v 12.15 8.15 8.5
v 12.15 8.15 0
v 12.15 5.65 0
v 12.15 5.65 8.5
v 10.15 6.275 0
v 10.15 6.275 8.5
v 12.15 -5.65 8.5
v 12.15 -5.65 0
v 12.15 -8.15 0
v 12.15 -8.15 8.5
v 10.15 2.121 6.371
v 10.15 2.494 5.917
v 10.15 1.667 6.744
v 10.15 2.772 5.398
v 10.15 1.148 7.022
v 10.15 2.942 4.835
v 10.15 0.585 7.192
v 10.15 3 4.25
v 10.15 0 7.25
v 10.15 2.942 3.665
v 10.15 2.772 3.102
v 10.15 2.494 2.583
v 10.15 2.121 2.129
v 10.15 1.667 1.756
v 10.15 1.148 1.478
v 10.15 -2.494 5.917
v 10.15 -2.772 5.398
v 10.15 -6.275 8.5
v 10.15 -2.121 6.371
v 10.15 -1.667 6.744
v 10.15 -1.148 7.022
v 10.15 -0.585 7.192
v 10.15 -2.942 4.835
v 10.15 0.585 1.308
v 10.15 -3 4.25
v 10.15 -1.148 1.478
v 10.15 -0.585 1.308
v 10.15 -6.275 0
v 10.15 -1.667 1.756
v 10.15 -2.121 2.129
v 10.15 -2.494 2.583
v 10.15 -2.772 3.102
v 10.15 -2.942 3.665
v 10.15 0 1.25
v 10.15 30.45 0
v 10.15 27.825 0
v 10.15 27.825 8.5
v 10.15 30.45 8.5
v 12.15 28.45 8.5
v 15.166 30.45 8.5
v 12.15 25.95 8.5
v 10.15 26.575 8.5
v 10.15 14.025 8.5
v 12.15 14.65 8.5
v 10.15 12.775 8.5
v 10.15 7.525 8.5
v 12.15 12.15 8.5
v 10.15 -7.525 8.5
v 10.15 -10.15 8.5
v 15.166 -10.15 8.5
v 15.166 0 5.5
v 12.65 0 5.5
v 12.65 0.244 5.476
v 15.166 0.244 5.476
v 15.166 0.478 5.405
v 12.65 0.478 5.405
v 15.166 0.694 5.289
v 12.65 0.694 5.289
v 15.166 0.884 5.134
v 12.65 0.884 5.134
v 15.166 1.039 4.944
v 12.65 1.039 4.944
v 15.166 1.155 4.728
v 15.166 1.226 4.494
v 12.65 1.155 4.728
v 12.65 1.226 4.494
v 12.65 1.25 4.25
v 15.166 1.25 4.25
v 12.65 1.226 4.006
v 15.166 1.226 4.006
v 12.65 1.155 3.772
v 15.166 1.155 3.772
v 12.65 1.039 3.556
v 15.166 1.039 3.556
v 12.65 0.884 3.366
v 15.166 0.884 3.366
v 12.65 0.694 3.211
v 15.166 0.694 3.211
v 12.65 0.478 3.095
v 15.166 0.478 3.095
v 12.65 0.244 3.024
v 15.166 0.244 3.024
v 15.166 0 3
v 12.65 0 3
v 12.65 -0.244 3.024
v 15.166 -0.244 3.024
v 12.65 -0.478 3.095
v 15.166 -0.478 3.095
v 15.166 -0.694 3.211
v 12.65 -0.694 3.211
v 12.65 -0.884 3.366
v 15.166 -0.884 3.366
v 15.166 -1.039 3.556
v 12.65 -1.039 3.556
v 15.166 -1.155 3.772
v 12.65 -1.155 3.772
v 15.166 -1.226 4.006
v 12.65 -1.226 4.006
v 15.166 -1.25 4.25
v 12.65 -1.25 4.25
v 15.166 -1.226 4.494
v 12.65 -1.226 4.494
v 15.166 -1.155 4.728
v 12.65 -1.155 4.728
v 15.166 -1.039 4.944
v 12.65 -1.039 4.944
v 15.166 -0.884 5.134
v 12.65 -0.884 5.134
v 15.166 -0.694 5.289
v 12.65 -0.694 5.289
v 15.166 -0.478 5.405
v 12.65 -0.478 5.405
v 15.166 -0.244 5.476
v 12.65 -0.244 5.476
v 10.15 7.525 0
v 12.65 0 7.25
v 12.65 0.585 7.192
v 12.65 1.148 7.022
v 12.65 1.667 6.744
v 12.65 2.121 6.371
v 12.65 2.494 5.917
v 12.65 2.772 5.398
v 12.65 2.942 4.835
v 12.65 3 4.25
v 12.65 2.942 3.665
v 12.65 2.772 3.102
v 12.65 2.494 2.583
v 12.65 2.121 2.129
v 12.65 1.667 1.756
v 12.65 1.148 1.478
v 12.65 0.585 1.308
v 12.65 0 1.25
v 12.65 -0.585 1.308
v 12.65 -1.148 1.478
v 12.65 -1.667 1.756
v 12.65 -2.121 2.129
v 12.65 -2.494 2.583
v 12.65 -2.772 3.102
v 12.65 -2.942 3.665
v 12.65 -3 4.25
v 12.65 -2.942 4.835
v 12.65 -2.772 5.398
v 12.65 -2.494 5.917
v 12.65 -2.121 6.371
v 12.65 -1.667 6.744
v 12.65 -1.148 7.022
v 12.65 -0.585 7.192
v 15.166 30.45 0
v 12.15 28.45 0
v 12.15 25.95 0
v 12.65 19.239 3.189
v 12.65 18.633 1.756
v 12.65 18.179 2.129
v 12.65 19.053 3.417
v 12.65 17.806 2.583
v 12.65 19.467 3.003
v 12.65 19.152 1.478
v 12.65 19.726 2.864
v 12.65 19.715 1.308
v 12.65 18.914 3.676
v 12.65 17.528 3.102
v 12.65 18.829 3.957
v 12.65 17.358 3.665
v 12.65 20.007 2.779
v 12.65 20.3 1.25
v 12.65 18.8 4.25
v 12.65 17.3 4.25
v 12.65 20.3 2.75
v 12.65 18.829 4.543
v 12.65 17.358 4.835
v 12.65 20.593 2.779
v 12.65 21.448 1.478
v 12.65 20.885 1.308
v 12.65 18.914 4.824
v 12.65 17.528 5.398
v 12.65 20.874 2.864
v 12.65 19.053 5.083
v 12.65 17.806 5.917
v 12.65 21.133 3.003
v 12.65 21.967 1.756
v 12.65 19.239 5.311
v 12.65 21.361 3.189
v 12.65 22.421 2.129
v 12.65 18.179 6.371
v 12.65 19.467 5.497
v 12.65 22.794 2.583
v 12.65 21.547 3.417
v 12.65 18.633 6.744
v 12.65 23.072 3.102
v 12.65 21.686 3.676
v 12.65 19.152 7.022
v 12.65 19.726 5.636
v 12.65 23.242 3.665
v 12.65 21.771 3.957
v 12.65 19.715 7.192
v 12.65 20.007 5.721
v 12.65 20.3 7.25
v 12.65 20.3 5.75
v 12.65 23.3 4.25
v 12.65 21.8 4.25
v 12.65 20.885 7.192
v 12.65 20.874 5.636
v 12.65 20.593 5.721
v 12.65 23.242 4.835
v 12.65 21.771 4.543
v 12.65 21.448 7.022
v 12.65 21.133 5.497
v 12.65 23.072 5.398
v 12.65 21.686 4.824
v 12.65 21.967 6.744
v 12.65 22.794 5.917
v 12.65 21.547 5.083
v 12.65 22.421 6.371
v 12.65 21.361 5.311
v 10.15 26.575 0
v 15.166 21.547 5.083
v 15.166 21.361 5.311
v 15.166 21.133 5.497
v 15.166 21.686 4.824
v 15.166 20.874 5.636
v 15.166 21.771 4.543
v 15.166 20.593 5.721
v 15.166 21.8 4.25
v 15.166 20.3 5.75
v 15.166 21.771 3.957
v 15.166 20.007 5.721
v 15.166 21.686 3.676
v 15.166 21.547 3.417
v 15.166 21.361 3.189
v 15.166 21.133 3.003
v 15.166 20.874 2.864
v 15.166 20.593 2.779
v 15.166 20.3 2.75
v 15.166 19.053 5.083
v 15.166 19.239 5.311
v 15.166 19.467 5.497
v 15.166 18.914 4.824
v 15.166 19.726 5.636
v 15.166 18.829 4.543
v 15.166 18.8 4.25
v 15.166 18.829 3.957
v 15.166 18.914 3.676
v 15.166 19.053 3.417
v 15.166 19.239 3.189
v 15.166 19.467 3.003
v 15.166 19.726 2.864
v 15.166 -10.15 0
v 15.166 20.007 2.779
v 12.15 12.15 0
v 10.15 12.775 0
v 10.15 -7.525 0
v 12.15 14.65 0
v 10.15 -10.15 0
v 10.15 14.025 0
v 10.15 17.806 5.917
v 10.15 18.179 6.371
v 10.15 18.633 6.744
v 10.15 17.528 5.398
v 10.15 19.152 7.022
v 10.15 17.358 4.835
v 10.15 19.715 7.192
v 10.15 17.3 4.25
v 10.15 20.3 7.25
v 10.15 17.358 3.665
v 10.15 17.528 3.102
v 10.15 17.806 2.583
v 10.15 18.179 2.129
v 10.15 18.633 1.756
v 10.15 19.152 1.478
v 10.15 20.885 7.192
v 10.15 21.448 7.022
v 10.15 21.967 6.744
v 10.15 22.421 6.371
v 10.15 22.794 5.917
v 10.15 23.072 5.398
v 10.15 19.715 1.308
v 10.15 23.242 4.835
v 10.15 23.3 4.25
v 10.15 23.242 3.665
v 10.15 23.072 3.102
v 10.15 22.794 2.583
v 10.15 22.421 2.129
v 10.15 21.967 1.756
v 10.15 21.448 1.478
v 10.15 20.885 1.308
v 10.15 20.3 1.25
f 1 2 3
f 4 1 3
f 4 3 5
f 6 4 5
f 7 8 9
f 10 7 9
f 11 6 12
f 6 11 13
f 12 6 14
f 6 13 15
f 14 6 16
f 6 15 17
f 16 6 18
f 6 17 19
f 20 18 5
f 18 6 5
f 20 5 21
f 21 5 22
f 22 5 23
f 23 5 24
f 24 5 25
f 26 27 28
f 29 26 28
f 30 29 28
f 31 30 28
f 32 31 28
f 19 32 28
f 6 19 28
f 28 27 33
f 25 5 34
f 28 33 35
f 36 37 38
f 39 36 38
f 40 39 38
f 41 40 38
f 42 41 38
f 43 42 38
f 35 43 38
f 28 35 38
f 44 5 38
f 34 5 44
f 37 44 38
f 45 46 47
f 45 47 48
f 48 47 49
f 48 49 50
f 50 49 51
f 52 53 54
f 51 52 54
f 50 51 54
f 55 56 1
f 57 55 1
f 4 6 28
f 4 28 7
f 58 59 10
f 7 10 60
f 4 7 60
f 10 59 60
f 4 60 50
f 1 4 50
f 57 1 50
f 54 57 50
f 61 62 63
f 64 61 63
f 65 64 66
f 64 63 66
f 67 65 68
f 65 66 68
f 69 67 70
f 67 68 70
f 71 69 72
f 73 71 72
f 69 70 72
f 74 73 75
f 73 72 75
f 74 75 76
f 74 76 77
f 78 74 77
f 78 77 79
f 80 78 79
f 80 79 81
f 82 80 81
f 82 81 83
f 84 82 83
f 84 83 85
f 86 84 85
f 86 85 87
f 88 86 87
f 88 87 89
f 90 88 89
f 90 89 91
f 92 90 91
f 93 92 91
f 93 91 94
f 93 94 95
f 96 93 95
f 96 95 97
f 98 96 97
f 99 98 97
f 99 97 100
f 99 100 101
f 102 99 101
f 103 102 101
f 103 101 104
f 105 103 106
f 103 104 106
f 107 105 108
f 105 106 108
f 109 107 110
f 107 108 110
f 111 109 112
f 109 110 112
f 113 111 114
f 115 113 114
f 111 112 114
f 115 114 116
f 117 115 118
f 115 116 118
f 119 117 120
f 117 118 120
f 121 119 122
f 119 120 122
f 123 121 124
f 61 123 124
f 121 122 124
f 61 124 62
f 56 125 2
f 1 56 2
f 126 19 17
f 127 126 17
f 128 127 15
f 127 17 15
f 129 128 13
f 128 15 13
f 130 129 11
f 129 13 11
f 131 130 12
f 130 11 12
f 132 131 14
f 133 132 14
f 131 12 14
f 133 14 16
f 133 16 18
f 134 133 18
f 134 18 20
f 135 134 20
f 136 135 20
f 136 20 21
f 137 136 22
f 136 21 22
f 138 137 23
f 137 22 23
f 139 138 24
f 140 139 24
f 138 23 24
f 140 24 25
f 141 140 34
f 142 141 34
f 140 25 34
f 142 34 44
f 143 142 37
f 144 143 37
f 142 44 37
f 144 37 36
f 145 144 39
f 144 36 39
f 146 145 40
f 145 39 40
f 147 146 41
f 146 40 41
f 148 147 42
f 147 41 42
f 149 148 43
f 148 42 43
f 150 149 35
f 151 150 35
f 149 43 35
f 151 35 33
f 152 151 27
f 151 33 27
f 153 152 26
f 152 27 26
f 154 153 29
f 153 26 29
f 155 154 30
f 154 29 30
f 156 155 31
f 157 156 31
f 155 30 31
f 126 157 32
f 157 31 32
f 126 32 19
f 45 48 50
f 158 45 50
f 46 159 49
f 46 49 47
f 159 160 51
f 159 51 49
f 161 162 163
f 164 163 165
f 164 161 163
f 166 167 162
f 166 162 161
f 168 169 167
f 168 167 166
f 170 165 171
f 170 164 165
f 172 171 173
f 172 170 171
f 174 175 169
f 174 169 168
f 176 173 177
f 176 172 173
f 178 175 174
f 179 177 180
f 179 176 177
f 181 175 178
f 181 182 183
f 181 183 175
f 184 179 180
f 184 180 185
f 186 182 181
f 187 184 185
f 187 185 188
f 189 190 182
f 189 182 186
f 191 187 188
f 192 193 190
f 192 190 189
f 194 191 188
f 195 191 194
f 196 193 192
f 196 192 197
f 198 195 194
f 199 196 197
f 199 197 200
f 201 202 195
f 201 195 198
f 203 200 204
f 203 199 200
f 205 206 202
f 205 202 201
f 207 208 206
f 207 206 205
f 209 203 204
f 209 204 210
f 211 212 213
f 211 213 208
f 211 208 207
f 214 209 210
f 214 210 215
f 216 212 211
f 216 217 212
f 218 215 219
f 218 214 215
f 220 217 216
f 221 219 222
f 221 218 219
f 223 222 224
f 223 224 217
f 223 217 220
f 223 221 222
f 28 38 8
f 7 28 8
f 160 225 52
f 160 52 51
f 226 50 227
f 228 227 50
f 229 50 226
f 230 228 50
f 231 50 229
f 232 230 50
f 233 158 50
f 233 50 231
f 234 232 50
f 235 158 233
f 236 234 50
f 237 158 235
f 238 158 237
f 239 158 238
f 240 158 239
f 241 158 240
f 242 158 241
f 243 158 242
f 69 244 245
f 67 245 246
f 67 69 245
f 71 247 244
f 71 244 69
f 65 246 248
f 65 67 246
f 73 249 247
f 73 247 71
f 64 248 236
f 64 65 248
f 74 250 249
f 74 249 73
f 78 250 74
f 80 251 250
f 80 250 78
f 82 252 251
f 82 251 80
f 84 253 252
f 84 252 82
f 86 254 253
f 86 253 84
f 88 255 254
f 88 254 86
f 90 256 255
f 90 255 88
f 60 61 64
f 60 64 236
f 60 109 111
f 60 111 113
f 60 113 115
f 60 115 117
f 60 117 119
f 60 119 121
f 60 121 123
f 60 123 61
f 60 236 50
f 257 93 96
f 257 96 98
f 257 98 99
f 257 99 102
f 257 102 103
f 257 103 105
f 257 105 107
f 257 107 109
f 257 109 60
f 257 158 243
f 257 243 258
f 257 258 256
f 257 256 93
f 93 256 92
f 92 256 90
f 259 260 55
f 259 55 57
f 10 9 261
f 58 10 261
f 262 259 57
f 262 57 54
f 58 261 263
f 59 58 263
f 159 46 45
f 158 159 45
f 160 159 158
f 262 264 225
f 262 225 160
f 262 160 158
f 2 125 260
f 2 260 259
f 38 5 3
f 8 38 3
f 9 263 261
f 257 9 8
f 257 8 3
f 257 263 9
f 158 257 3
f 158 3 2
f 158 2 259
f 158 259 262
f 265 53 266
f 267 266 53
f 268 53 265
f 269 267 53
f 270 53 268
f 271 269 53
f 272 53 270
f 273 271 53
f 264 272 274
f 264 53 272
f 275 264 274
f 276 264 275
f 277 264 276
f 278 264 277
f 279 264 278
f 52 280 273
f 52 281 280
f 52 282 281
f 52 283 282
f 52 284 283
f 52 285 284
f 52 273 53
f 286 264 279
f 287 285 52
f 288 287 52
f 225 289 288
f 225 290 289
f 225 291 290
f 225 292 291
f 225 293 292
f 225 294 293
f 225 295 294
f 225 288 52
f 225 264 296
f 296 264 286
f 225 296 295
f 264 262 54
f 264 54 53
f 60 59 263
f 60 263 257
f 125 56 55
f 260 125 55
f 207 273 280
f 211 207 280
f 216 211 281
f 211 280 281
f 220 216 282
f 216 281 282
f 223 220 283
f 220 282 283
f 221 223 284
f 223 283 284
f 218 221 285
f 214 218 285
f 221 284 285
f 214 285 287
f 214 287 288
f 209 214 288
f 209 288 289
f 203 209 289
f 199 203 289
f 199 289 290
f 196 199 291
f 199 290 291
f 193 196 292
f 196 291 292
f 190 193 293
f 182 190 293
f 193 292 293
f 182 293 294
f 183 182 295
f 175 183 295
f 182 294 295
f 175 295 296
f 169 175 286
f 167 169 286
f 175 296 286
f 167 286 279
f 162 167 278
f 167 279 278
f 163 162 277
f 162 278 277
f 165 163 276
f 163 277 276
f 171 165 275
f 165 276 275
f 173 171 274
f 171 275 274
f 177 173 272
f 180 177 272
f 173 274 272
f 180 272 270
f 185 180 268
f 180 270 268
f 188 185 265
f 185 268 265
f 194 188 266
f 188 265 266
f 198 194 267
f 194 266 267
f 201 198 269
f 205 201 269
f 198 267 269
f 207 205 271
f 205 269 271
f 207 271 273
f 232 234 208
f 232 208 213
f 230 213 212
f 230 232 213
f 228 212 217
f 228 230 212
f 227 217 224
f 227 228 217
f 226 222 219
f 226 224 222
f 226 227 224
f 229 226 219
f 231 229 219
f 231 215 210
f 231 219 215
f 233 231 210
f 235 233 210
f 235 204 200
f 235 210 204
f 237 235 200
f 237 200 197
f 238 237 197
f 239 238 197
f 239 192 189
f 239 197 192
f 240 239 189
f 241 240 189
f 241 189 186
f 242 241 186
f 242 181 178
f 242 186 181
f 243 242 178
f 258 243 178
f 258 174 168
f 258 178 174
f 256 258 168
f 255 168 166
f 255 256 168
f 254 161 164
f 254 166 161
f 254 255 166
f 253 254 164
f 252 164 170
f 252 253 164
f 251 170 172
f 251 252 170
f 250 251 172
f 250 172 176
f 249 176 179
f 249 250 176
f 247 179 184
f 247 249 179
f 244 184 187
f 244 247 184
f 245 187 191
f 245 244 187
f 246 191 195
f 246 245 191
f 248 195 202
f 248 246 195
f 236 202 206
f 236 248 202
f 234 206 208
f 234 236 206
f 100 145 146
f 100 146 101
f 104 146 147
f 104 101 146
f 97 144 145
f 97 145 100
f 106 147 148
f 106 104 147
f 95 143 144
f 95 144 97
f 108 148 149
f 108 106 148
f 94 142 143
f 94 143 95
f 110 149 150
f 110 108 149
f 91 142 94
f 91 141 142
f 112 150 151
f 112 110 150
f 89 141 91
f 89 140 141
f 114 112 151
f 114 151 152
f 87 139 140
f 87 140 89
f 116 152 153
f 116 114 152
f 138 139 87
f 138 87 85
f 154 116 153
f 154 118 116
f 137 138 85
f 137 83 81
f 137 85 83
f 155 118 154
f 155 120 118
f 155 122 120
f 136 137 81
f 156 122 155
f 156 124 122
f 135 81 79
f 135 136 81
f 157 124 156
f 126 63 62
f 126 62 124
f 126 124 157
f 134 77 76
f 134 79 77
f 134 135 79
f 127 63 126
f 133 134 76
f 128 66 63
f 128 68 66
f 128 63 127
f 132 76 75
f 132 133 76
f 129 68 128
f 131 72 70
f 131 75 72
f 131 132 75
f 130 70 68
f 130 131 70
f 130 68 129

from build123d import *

# Parameters (mm, degrees)
SALIENTE_EXTRUIR1_DEPTH    = 8.5
CROQUIS2_R                 = 1.25
CORTAR_EXTRUIR1_DEPTH      = 8.5
CROQUIS3_R                 = 3
CORTAR_EXTRUIR2_DEPTH      = 2.5
CORTAR_EXTRUIR3_DEPTH      = 33.009517698
CORTAR_EXTRUIR3_DEPTH_BACK = 33.009517698
CROQUIS4_R                 = 1.5
CROQUIS5_R                 = 3
CORTAR_EXTRUIR4_DEPTH      = 2.5


with BuildPart() as part:
    # Croquis1 → Saliente-Extruir1 (new body)
    with BuildSketch(Plane.XY):
        Polygon((12.15, 8.15), (12.15, 5.65), (10.15, 6.275), (10.15, -6.275), (12.15, -5.65), (12.15, -8.15), (10.15, -7.525), (10.15, -10.15), (15.165647838, -10.15), (15.165647838, 10.15), (10.15, 10.15), (10.15, 7.525), align=None)
    saliente_extruir1 = extrude(amount=SALIENTE_EXTRUIR1_DEPTH)

    # Croquis2 → Cortar-Extruir1 (cut)
    with BuildSketch(Plane.ZY.offset(-10.15)):
        with Locations((4.25, 0)):
            Circle(CROQUIS2_R)
    extrude(amount=-CORTAR_EXTRUIR1_DEPTH, mode=Mode.SUBTRACT)

    # Croquis3 → Cortar-Extruir2 (cut)
    with BuildSketch(Plane.ZY.offset(-10.15)):
        with Locations((4.25, 0)):
            Circle(CROQUIS3_R)
    extrude(amount=-CORTAR_EXTRUIR2_DEPTH, mode=Mode.SUBTRACT)

    # Simetría1: Saliente-Extruir1 across plane
    add(saliente_extruir1.mirror(Plane(origin=(10.15, 10.15, 8.5), x_dir=(0, 0, 1), z_dir=(0, -1, 0))))

    # Croquis4 → Cortar-Extruir3 (cut, two sides: drawn at the far end of the back side and taken through both)
    with BuildSketch(Plane.ZY.offset(-10.15).offset(-CORTAR_EXTRUIR3_DEPTH_BACK)):
        with Locations((4.25, 20.3)):
            Circle(CROQUIS4_R)
    extrude(amount=CORTAR_EXTRUIR3_DEPTH + CORTAR_EXTRUIR3_DEPTH_BACK, mode=Mode.SUBTRACT)

    # Croquis5 → Cortar-Extruir4 (cut)
    with BuildSketch(Plane.ZY.offset(-10.15)):
        with Locations((4.25, 20.3)):
            Circle(CROQUIS5_R)
    extrude(amount=-CORTAR_EXTRUIR4_DEPTH, mode=Mode.SUBTRACT)


solid = part.part
